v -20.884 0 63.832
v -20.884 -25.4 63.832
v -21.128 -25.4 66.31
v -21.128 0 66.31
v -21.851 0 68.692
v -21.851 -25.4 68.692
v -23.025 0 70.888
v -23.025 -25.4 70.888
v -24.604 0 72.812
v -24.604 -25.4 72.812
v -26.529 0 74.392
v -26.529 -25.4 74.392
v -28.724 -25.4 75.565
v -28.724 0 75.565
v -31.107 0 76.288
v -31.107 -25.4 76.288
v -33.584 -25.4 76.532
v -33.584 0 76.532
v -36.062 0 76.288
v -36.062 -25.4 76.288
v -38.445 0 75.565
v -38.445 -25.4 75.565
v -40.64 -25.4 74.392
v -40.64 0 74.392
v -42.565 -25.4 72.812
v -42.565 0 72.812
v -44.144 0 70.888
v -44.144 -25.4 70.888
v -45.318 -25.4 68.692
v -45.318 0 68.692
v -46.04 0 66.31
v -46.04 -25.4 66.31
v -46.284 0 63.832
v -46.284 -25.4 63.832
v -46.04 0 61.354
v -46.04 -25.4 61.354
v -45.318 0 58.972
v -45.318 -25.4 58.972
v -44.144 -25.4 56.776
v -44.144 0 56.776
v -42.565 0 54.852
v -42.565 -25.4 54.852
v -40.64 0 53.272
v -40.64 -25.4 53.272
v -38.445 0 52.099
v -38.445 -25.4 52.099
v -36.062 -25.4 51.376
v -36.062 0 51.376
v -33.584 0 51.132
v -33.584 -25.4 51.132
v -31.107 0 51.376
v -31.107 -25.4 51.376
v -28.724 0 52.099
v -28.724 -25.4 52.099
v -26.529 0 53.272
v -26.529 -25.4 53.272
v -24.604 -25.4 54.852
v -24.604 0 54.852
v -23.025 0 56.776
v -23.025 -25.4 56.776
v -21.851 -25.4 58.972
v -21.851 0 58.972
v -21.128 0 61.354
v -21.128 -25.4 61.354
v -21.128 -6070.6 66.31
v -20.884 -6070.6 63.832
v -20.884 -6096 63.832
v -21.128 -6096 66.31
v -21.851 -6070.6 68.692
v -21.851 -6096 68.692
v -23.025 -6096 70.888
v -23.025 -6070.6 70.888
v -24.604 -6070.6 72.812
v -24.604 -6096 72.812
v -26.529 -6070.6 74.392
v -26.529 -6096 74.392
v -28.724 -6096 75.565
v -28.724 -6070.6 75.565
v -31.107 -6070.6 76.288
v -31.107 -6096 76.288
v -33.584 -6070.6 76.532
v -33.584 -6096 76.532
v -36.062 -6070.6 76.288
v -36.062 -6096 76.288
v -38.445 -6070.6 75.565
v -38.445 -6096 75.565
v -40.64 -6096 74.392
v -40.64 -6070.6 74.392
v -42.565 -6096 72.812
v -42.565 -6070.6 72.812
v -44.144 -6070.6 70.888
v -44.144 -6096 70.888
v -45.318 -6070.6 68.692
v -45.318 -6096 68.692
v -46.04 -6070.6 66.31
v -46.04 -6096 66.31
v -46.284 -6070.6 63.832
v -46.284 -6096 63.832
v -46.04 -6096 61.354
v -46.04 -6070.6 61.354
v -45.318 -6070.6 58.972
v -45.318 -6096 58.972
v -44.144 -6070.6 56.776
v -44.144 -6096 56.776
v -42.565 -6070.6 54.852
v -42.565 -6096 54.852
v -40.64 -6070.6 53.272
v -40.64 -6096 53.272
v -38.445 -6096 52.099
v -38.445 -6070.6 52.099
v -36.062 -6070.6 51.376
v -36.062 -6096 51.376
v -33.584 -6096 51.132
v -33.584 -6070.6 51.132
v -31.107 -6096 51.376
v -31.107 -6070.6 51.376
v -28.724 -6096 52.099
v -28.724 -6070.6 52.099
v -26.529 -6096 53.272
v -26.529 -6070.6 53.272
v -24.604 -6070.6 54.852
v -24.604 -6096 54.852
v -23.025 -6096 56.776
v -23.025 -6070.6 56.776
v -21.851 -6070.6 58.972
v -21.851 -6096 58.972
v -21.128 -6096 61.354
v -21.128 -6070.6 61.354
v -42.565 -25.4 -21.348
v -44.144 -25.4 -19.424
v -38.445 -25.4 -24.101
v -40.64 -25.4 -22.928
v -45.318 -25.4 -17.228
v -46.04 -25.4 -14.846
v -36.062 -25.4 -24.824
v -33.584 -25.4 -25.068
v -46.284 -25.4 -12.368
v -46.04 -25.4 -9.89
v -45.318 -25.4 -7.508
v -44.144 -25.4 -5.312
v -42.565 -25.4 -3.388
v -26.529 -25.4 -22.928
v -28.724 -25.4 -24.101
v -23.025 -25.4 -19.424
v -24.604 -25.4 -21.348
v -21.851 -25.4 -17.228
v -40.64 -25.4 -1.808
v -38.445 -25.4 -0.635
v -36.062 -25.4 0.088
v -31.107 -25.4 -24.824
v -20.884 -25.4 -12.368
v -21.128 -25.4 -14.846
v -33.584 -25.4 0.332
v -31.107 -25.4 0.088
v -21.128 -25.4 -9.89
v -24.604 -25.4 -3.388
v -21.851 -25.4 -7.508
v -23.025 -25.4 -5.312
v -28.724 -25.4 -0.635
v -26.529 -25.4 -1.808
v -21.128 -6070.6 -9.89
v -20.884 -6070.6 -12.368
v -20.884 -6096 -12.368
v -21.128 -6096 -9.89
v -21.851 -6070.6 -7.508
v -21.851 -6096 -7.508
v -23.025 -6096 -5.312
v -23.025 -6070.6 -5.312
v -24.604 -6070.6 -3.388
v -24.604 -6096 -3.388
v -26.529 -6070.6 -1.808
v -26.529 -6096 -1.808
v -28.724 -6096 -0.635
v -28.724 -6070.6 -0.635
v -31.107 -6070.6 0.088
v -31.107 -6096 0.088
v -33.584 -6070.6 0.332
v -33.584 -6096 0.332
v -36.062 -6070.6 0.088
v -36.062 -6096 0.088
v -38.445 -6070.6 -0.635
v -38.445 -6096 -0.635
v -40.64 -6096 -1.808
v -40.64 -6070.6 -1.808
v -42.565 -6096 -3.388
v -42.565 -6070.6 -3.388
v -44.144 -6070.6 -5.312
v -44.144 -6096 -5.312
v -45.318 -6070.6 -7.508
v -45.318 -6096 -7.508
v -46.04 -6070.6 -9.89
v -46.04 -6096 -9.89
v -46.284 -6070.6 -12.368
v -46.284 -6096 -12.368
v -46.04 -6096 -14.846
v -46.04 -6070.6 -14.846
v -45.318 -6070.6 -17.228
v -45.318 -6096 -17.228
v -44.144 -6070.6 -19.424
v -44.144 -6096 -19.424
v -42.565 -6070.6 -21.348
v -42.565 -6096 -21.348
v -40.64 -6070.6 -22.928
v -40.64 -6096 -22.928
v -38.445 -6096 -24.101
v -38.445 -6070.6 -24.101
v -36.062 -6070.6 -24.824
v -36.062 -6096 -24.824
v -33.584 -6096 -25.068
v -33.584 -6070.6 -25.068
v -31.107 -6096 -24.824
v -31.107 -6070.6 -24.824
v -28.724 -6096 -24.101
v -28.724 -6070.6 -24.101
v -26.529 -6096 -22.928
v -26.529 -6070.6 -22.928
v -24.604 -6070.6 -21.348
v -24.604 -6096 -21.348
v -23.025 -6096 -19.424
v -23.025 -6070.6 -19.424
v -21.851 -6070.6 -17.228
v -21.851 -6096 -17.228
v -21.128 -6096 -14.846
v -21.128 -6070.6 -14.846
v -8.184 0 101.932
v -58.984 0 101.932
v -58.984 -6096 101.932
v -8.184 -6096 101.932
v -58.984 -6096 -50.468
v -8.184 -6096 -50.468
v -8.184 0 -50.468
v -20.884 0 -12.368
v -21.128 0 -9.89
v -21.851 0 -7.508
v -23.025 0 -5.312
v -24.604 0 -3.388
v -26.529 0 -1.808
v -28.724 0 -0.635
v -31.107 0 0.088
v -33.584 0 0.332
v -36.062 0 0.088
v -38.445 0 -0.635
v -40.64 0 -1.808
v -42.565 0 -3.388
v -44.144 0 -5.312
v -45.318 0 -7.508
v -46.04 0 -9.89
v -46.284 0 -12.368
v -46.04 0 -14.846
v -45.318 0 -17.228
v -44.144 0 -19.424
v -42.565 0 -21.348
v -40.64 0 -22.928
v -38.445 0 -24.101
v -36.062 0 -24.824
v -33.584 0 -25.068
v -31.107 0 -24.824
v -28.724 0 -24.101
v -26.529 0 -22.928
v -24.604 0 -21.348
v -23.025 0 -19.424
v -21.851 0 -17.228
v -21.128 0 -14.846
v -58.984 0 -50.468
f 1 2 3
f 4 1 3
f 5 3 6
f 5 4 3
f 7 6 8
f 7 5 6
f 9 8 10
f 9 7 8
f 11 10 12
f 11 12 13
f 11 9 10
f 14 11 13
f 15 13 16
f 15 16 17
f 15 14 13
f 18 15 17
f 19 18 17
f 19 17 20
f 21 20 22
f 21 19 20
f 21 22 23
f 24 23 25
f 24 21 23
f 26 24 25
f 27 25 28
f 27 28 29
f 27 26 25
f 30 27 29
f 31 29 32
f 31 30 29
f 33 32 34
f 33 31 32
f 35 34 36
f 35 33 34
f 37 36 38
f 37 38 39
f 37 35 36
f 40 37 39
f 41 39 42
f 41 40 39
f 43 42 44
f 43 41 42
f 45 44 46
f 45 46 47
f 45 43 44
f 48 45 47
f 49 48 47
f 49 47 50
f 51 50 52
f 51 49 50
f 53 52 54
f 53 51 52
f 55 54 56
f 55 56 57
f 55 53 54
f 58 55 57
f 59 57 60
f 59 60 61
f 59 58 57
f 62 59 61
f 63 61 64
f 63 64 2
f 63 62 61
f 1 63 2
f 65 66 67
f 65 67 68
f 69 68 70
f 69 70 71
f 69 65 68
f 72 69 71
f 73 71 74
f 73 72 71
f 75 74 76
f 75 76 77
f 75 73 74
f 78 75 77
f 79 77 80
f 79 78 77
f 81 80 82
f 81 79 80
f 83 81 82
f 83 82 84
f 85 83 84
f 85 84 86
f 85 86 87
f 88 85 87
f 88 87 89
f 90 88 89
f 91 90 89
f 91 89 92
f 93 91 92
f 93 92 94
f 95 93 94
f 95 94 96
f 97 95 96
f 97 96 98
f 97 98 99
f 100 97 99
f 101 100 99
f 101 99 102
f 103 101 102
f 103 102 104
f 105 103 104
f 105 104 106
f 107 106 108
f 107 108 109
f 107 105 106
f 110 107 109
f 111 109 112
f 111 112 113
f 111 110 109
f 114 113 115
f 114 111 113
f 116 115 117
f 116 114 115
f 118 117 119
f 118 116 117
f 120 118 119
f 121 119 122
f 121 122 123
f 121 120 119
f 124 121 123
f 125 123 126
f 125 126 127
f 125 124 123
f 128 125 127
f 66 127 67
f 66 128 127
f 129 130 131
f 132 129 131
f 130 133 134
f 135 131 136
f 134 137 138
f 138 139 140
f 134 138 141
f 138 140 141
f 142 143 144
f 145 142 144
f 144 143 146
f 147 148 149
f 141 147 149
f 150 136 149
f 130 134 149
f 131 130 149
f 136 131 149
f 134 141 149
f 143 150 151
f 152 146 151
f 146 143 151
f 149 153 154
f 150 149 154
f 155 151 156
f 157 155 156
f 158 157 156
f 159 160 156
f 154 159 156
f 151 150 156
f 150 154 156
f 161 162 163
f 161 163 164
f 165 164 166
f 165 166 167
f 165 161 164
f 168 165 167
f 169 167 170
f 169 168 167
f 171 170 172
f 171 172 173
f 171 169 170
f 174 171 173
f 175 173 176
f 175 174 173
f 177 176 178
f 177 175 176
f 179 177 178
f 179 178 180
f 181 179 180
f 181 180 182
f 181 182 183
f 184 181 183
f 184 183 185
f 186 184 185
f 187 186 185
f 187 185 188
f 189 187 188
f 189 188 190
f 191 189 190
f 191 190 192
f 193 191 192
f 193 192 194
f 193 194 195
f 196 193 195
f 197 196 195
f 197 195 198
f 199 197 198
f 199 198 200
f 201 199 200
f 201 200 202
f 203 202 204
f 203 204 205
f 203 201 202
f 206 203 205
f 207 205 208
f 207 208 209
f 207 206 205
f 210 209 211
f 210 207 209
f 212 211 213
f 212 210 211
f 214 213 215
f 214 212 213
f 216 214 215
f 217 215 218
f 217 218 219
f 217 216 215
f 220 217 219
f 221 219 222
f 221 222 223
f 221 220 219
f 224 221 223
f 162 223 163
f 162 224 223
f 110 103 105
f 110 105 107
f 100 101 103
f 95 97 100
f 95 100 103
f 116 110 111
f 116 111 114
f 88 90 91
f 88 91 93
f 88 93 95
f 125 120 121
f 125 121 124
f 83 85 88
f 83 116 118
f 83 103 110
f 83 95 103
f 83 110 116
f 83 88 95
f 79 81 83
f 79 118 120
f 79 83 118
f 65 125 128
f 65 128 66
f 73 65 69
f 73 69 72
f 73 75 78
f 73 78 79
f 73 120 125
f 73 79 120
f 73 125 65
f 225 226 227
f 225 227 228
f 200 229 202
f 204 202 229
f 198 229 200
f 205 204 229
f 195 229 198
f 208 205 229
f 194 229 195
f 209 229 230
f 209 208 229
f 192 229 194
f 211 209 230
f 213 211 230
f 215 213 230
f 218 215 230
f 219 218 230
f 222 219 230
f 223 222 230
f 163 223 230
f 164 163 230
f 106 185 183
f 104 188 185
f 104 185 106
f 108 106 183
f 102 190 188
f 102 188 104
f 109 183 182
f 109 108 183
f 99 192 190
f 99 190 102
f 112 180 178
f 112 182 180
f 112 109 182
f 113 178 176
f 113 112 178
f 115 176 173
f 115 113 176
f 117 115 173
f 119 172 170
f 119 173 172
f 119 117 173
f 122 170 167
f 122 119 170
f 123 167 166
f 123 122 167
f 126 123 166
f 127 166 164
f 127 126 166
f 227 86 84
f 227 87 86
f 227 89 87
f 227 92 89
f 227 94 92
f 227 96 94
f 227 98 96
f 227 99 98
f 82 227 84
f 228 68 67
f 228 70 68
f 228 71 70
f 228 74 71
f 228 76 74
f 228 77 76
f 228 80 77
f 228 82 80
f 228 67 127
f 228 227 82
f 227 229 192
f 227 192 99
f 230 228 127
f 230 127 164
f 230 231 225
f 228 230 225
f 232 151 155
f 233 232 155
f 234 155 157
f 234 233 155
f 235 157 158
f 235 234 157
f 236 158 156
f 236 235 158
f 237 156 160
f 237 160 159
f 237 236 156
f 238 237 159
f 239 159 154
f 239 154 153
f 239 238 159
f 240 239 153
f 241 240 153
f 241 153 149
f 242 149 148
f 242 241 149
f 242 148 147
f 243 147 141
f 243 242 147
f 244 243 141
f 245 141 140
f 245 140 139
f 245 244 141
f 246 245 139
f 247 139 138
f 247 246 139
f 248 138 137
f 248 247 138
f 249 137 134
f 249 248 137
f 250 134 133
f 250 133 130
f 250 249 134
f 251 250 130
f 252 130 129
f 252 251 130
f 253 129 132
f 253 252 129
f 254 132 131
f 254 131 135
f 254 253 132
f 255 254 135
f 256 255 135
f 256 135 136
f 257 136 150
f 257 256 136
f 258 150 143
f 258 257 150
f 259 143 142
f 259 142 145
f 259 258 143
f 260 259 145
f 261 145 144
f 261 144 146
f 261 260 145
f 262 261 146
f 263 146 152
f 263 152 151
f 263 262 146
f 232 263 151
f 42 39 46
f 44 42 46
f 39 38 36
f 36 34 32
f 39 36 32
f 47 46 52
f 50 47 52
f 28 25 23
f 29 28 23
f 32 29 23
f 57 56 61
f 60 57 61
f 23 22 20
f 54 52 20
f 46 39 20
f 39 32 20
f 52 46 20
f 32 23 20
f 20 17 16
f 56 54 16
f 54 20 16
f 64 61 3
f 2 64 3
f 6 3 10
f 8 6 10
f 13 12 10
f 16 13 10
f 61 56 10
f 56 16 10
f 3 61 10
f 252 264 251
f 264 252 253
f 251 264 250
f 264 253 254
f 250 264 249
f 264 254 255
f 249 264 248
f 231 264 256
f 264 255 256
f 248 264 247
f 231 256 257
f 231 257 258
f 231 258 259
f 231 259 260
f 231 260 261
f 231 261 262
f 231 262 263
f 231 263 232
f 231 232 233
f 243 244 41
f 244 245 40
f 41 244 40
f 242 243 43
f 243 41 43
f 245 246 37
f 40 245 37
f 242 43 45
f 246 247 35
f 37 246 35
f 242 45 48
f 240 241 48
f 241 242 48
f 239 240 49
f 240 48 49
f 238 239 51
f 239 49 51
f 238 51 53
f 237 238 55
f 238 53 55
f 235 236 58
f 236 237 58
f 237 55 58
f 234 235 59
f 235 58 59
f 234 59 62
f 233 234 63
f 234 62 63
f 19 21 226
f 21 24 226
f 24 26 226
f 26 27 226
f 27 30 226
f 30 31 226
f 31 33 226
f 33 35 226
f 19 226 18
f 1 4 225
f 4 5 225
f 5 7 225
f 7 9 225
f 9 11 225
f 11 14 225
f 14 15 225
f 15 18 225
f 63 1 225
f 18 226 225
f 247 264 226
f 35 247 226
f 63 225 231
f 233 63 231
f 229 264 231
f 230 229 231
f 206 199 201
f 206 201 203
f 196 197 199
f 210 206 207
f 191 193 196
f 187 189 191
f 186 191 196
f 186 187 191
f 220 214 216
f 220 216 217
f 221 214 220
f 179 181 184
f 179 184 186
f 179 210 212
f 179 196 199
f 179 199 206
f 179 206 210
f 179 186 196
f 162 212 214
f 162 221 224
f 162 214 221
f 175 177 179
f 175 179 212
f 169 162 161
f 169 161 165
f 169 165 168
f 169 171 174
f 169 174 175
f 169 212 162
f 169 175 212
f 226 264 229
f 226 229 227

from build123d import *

# Parameters (mm, degrees)
F0_W     = 50.8
F0_H     = 152.4
F0_R     = 12.7
F1_DEPTH = 6096
F2_DEPTH = 6070.6
F3_DEPTH = 25.4


with BuildPart() as f1:
    # F0 (on Front) → F1 (new body)
    with BuildSketch(Plane.XZ):
        with Locations((-33.584445, 25.731898)):
            Rectangle(F0_W, F0_H)
        with Locations((-33.584445, -12.368102)):
            Circle(F0_R, mode=Mode.SUBTRACT)
        with Locations((-33.584445, 63.831898)):
            Circle(F0_R, mode=Mode.SUBTRACT)
    extrude(amount=F1_DEPTH)

    # F0 (on Front) → F2 (join)
    with BuildSketch(Plane.XZ):
        with Locations((-33.584445, 63.831898)):
            Circle(F0_R)
        with Locations((-33.584445, -12.368102)):
            Circle(F0_R)
    extrude(amount=F2_DEPTH)

    # F0 (on Front) → F3 (cut)
    with BuildSketch(Plane.XZ):
        with Locations((-33.584445, 63.831898)):
            Circle(F0_R)
        with Locations((-33.584445, -12.368102)):
            Circle(F0_R)
    extrude(amount=F3_DEPTH, mode=Mode.SUBTRACT)


solid = f1.part
